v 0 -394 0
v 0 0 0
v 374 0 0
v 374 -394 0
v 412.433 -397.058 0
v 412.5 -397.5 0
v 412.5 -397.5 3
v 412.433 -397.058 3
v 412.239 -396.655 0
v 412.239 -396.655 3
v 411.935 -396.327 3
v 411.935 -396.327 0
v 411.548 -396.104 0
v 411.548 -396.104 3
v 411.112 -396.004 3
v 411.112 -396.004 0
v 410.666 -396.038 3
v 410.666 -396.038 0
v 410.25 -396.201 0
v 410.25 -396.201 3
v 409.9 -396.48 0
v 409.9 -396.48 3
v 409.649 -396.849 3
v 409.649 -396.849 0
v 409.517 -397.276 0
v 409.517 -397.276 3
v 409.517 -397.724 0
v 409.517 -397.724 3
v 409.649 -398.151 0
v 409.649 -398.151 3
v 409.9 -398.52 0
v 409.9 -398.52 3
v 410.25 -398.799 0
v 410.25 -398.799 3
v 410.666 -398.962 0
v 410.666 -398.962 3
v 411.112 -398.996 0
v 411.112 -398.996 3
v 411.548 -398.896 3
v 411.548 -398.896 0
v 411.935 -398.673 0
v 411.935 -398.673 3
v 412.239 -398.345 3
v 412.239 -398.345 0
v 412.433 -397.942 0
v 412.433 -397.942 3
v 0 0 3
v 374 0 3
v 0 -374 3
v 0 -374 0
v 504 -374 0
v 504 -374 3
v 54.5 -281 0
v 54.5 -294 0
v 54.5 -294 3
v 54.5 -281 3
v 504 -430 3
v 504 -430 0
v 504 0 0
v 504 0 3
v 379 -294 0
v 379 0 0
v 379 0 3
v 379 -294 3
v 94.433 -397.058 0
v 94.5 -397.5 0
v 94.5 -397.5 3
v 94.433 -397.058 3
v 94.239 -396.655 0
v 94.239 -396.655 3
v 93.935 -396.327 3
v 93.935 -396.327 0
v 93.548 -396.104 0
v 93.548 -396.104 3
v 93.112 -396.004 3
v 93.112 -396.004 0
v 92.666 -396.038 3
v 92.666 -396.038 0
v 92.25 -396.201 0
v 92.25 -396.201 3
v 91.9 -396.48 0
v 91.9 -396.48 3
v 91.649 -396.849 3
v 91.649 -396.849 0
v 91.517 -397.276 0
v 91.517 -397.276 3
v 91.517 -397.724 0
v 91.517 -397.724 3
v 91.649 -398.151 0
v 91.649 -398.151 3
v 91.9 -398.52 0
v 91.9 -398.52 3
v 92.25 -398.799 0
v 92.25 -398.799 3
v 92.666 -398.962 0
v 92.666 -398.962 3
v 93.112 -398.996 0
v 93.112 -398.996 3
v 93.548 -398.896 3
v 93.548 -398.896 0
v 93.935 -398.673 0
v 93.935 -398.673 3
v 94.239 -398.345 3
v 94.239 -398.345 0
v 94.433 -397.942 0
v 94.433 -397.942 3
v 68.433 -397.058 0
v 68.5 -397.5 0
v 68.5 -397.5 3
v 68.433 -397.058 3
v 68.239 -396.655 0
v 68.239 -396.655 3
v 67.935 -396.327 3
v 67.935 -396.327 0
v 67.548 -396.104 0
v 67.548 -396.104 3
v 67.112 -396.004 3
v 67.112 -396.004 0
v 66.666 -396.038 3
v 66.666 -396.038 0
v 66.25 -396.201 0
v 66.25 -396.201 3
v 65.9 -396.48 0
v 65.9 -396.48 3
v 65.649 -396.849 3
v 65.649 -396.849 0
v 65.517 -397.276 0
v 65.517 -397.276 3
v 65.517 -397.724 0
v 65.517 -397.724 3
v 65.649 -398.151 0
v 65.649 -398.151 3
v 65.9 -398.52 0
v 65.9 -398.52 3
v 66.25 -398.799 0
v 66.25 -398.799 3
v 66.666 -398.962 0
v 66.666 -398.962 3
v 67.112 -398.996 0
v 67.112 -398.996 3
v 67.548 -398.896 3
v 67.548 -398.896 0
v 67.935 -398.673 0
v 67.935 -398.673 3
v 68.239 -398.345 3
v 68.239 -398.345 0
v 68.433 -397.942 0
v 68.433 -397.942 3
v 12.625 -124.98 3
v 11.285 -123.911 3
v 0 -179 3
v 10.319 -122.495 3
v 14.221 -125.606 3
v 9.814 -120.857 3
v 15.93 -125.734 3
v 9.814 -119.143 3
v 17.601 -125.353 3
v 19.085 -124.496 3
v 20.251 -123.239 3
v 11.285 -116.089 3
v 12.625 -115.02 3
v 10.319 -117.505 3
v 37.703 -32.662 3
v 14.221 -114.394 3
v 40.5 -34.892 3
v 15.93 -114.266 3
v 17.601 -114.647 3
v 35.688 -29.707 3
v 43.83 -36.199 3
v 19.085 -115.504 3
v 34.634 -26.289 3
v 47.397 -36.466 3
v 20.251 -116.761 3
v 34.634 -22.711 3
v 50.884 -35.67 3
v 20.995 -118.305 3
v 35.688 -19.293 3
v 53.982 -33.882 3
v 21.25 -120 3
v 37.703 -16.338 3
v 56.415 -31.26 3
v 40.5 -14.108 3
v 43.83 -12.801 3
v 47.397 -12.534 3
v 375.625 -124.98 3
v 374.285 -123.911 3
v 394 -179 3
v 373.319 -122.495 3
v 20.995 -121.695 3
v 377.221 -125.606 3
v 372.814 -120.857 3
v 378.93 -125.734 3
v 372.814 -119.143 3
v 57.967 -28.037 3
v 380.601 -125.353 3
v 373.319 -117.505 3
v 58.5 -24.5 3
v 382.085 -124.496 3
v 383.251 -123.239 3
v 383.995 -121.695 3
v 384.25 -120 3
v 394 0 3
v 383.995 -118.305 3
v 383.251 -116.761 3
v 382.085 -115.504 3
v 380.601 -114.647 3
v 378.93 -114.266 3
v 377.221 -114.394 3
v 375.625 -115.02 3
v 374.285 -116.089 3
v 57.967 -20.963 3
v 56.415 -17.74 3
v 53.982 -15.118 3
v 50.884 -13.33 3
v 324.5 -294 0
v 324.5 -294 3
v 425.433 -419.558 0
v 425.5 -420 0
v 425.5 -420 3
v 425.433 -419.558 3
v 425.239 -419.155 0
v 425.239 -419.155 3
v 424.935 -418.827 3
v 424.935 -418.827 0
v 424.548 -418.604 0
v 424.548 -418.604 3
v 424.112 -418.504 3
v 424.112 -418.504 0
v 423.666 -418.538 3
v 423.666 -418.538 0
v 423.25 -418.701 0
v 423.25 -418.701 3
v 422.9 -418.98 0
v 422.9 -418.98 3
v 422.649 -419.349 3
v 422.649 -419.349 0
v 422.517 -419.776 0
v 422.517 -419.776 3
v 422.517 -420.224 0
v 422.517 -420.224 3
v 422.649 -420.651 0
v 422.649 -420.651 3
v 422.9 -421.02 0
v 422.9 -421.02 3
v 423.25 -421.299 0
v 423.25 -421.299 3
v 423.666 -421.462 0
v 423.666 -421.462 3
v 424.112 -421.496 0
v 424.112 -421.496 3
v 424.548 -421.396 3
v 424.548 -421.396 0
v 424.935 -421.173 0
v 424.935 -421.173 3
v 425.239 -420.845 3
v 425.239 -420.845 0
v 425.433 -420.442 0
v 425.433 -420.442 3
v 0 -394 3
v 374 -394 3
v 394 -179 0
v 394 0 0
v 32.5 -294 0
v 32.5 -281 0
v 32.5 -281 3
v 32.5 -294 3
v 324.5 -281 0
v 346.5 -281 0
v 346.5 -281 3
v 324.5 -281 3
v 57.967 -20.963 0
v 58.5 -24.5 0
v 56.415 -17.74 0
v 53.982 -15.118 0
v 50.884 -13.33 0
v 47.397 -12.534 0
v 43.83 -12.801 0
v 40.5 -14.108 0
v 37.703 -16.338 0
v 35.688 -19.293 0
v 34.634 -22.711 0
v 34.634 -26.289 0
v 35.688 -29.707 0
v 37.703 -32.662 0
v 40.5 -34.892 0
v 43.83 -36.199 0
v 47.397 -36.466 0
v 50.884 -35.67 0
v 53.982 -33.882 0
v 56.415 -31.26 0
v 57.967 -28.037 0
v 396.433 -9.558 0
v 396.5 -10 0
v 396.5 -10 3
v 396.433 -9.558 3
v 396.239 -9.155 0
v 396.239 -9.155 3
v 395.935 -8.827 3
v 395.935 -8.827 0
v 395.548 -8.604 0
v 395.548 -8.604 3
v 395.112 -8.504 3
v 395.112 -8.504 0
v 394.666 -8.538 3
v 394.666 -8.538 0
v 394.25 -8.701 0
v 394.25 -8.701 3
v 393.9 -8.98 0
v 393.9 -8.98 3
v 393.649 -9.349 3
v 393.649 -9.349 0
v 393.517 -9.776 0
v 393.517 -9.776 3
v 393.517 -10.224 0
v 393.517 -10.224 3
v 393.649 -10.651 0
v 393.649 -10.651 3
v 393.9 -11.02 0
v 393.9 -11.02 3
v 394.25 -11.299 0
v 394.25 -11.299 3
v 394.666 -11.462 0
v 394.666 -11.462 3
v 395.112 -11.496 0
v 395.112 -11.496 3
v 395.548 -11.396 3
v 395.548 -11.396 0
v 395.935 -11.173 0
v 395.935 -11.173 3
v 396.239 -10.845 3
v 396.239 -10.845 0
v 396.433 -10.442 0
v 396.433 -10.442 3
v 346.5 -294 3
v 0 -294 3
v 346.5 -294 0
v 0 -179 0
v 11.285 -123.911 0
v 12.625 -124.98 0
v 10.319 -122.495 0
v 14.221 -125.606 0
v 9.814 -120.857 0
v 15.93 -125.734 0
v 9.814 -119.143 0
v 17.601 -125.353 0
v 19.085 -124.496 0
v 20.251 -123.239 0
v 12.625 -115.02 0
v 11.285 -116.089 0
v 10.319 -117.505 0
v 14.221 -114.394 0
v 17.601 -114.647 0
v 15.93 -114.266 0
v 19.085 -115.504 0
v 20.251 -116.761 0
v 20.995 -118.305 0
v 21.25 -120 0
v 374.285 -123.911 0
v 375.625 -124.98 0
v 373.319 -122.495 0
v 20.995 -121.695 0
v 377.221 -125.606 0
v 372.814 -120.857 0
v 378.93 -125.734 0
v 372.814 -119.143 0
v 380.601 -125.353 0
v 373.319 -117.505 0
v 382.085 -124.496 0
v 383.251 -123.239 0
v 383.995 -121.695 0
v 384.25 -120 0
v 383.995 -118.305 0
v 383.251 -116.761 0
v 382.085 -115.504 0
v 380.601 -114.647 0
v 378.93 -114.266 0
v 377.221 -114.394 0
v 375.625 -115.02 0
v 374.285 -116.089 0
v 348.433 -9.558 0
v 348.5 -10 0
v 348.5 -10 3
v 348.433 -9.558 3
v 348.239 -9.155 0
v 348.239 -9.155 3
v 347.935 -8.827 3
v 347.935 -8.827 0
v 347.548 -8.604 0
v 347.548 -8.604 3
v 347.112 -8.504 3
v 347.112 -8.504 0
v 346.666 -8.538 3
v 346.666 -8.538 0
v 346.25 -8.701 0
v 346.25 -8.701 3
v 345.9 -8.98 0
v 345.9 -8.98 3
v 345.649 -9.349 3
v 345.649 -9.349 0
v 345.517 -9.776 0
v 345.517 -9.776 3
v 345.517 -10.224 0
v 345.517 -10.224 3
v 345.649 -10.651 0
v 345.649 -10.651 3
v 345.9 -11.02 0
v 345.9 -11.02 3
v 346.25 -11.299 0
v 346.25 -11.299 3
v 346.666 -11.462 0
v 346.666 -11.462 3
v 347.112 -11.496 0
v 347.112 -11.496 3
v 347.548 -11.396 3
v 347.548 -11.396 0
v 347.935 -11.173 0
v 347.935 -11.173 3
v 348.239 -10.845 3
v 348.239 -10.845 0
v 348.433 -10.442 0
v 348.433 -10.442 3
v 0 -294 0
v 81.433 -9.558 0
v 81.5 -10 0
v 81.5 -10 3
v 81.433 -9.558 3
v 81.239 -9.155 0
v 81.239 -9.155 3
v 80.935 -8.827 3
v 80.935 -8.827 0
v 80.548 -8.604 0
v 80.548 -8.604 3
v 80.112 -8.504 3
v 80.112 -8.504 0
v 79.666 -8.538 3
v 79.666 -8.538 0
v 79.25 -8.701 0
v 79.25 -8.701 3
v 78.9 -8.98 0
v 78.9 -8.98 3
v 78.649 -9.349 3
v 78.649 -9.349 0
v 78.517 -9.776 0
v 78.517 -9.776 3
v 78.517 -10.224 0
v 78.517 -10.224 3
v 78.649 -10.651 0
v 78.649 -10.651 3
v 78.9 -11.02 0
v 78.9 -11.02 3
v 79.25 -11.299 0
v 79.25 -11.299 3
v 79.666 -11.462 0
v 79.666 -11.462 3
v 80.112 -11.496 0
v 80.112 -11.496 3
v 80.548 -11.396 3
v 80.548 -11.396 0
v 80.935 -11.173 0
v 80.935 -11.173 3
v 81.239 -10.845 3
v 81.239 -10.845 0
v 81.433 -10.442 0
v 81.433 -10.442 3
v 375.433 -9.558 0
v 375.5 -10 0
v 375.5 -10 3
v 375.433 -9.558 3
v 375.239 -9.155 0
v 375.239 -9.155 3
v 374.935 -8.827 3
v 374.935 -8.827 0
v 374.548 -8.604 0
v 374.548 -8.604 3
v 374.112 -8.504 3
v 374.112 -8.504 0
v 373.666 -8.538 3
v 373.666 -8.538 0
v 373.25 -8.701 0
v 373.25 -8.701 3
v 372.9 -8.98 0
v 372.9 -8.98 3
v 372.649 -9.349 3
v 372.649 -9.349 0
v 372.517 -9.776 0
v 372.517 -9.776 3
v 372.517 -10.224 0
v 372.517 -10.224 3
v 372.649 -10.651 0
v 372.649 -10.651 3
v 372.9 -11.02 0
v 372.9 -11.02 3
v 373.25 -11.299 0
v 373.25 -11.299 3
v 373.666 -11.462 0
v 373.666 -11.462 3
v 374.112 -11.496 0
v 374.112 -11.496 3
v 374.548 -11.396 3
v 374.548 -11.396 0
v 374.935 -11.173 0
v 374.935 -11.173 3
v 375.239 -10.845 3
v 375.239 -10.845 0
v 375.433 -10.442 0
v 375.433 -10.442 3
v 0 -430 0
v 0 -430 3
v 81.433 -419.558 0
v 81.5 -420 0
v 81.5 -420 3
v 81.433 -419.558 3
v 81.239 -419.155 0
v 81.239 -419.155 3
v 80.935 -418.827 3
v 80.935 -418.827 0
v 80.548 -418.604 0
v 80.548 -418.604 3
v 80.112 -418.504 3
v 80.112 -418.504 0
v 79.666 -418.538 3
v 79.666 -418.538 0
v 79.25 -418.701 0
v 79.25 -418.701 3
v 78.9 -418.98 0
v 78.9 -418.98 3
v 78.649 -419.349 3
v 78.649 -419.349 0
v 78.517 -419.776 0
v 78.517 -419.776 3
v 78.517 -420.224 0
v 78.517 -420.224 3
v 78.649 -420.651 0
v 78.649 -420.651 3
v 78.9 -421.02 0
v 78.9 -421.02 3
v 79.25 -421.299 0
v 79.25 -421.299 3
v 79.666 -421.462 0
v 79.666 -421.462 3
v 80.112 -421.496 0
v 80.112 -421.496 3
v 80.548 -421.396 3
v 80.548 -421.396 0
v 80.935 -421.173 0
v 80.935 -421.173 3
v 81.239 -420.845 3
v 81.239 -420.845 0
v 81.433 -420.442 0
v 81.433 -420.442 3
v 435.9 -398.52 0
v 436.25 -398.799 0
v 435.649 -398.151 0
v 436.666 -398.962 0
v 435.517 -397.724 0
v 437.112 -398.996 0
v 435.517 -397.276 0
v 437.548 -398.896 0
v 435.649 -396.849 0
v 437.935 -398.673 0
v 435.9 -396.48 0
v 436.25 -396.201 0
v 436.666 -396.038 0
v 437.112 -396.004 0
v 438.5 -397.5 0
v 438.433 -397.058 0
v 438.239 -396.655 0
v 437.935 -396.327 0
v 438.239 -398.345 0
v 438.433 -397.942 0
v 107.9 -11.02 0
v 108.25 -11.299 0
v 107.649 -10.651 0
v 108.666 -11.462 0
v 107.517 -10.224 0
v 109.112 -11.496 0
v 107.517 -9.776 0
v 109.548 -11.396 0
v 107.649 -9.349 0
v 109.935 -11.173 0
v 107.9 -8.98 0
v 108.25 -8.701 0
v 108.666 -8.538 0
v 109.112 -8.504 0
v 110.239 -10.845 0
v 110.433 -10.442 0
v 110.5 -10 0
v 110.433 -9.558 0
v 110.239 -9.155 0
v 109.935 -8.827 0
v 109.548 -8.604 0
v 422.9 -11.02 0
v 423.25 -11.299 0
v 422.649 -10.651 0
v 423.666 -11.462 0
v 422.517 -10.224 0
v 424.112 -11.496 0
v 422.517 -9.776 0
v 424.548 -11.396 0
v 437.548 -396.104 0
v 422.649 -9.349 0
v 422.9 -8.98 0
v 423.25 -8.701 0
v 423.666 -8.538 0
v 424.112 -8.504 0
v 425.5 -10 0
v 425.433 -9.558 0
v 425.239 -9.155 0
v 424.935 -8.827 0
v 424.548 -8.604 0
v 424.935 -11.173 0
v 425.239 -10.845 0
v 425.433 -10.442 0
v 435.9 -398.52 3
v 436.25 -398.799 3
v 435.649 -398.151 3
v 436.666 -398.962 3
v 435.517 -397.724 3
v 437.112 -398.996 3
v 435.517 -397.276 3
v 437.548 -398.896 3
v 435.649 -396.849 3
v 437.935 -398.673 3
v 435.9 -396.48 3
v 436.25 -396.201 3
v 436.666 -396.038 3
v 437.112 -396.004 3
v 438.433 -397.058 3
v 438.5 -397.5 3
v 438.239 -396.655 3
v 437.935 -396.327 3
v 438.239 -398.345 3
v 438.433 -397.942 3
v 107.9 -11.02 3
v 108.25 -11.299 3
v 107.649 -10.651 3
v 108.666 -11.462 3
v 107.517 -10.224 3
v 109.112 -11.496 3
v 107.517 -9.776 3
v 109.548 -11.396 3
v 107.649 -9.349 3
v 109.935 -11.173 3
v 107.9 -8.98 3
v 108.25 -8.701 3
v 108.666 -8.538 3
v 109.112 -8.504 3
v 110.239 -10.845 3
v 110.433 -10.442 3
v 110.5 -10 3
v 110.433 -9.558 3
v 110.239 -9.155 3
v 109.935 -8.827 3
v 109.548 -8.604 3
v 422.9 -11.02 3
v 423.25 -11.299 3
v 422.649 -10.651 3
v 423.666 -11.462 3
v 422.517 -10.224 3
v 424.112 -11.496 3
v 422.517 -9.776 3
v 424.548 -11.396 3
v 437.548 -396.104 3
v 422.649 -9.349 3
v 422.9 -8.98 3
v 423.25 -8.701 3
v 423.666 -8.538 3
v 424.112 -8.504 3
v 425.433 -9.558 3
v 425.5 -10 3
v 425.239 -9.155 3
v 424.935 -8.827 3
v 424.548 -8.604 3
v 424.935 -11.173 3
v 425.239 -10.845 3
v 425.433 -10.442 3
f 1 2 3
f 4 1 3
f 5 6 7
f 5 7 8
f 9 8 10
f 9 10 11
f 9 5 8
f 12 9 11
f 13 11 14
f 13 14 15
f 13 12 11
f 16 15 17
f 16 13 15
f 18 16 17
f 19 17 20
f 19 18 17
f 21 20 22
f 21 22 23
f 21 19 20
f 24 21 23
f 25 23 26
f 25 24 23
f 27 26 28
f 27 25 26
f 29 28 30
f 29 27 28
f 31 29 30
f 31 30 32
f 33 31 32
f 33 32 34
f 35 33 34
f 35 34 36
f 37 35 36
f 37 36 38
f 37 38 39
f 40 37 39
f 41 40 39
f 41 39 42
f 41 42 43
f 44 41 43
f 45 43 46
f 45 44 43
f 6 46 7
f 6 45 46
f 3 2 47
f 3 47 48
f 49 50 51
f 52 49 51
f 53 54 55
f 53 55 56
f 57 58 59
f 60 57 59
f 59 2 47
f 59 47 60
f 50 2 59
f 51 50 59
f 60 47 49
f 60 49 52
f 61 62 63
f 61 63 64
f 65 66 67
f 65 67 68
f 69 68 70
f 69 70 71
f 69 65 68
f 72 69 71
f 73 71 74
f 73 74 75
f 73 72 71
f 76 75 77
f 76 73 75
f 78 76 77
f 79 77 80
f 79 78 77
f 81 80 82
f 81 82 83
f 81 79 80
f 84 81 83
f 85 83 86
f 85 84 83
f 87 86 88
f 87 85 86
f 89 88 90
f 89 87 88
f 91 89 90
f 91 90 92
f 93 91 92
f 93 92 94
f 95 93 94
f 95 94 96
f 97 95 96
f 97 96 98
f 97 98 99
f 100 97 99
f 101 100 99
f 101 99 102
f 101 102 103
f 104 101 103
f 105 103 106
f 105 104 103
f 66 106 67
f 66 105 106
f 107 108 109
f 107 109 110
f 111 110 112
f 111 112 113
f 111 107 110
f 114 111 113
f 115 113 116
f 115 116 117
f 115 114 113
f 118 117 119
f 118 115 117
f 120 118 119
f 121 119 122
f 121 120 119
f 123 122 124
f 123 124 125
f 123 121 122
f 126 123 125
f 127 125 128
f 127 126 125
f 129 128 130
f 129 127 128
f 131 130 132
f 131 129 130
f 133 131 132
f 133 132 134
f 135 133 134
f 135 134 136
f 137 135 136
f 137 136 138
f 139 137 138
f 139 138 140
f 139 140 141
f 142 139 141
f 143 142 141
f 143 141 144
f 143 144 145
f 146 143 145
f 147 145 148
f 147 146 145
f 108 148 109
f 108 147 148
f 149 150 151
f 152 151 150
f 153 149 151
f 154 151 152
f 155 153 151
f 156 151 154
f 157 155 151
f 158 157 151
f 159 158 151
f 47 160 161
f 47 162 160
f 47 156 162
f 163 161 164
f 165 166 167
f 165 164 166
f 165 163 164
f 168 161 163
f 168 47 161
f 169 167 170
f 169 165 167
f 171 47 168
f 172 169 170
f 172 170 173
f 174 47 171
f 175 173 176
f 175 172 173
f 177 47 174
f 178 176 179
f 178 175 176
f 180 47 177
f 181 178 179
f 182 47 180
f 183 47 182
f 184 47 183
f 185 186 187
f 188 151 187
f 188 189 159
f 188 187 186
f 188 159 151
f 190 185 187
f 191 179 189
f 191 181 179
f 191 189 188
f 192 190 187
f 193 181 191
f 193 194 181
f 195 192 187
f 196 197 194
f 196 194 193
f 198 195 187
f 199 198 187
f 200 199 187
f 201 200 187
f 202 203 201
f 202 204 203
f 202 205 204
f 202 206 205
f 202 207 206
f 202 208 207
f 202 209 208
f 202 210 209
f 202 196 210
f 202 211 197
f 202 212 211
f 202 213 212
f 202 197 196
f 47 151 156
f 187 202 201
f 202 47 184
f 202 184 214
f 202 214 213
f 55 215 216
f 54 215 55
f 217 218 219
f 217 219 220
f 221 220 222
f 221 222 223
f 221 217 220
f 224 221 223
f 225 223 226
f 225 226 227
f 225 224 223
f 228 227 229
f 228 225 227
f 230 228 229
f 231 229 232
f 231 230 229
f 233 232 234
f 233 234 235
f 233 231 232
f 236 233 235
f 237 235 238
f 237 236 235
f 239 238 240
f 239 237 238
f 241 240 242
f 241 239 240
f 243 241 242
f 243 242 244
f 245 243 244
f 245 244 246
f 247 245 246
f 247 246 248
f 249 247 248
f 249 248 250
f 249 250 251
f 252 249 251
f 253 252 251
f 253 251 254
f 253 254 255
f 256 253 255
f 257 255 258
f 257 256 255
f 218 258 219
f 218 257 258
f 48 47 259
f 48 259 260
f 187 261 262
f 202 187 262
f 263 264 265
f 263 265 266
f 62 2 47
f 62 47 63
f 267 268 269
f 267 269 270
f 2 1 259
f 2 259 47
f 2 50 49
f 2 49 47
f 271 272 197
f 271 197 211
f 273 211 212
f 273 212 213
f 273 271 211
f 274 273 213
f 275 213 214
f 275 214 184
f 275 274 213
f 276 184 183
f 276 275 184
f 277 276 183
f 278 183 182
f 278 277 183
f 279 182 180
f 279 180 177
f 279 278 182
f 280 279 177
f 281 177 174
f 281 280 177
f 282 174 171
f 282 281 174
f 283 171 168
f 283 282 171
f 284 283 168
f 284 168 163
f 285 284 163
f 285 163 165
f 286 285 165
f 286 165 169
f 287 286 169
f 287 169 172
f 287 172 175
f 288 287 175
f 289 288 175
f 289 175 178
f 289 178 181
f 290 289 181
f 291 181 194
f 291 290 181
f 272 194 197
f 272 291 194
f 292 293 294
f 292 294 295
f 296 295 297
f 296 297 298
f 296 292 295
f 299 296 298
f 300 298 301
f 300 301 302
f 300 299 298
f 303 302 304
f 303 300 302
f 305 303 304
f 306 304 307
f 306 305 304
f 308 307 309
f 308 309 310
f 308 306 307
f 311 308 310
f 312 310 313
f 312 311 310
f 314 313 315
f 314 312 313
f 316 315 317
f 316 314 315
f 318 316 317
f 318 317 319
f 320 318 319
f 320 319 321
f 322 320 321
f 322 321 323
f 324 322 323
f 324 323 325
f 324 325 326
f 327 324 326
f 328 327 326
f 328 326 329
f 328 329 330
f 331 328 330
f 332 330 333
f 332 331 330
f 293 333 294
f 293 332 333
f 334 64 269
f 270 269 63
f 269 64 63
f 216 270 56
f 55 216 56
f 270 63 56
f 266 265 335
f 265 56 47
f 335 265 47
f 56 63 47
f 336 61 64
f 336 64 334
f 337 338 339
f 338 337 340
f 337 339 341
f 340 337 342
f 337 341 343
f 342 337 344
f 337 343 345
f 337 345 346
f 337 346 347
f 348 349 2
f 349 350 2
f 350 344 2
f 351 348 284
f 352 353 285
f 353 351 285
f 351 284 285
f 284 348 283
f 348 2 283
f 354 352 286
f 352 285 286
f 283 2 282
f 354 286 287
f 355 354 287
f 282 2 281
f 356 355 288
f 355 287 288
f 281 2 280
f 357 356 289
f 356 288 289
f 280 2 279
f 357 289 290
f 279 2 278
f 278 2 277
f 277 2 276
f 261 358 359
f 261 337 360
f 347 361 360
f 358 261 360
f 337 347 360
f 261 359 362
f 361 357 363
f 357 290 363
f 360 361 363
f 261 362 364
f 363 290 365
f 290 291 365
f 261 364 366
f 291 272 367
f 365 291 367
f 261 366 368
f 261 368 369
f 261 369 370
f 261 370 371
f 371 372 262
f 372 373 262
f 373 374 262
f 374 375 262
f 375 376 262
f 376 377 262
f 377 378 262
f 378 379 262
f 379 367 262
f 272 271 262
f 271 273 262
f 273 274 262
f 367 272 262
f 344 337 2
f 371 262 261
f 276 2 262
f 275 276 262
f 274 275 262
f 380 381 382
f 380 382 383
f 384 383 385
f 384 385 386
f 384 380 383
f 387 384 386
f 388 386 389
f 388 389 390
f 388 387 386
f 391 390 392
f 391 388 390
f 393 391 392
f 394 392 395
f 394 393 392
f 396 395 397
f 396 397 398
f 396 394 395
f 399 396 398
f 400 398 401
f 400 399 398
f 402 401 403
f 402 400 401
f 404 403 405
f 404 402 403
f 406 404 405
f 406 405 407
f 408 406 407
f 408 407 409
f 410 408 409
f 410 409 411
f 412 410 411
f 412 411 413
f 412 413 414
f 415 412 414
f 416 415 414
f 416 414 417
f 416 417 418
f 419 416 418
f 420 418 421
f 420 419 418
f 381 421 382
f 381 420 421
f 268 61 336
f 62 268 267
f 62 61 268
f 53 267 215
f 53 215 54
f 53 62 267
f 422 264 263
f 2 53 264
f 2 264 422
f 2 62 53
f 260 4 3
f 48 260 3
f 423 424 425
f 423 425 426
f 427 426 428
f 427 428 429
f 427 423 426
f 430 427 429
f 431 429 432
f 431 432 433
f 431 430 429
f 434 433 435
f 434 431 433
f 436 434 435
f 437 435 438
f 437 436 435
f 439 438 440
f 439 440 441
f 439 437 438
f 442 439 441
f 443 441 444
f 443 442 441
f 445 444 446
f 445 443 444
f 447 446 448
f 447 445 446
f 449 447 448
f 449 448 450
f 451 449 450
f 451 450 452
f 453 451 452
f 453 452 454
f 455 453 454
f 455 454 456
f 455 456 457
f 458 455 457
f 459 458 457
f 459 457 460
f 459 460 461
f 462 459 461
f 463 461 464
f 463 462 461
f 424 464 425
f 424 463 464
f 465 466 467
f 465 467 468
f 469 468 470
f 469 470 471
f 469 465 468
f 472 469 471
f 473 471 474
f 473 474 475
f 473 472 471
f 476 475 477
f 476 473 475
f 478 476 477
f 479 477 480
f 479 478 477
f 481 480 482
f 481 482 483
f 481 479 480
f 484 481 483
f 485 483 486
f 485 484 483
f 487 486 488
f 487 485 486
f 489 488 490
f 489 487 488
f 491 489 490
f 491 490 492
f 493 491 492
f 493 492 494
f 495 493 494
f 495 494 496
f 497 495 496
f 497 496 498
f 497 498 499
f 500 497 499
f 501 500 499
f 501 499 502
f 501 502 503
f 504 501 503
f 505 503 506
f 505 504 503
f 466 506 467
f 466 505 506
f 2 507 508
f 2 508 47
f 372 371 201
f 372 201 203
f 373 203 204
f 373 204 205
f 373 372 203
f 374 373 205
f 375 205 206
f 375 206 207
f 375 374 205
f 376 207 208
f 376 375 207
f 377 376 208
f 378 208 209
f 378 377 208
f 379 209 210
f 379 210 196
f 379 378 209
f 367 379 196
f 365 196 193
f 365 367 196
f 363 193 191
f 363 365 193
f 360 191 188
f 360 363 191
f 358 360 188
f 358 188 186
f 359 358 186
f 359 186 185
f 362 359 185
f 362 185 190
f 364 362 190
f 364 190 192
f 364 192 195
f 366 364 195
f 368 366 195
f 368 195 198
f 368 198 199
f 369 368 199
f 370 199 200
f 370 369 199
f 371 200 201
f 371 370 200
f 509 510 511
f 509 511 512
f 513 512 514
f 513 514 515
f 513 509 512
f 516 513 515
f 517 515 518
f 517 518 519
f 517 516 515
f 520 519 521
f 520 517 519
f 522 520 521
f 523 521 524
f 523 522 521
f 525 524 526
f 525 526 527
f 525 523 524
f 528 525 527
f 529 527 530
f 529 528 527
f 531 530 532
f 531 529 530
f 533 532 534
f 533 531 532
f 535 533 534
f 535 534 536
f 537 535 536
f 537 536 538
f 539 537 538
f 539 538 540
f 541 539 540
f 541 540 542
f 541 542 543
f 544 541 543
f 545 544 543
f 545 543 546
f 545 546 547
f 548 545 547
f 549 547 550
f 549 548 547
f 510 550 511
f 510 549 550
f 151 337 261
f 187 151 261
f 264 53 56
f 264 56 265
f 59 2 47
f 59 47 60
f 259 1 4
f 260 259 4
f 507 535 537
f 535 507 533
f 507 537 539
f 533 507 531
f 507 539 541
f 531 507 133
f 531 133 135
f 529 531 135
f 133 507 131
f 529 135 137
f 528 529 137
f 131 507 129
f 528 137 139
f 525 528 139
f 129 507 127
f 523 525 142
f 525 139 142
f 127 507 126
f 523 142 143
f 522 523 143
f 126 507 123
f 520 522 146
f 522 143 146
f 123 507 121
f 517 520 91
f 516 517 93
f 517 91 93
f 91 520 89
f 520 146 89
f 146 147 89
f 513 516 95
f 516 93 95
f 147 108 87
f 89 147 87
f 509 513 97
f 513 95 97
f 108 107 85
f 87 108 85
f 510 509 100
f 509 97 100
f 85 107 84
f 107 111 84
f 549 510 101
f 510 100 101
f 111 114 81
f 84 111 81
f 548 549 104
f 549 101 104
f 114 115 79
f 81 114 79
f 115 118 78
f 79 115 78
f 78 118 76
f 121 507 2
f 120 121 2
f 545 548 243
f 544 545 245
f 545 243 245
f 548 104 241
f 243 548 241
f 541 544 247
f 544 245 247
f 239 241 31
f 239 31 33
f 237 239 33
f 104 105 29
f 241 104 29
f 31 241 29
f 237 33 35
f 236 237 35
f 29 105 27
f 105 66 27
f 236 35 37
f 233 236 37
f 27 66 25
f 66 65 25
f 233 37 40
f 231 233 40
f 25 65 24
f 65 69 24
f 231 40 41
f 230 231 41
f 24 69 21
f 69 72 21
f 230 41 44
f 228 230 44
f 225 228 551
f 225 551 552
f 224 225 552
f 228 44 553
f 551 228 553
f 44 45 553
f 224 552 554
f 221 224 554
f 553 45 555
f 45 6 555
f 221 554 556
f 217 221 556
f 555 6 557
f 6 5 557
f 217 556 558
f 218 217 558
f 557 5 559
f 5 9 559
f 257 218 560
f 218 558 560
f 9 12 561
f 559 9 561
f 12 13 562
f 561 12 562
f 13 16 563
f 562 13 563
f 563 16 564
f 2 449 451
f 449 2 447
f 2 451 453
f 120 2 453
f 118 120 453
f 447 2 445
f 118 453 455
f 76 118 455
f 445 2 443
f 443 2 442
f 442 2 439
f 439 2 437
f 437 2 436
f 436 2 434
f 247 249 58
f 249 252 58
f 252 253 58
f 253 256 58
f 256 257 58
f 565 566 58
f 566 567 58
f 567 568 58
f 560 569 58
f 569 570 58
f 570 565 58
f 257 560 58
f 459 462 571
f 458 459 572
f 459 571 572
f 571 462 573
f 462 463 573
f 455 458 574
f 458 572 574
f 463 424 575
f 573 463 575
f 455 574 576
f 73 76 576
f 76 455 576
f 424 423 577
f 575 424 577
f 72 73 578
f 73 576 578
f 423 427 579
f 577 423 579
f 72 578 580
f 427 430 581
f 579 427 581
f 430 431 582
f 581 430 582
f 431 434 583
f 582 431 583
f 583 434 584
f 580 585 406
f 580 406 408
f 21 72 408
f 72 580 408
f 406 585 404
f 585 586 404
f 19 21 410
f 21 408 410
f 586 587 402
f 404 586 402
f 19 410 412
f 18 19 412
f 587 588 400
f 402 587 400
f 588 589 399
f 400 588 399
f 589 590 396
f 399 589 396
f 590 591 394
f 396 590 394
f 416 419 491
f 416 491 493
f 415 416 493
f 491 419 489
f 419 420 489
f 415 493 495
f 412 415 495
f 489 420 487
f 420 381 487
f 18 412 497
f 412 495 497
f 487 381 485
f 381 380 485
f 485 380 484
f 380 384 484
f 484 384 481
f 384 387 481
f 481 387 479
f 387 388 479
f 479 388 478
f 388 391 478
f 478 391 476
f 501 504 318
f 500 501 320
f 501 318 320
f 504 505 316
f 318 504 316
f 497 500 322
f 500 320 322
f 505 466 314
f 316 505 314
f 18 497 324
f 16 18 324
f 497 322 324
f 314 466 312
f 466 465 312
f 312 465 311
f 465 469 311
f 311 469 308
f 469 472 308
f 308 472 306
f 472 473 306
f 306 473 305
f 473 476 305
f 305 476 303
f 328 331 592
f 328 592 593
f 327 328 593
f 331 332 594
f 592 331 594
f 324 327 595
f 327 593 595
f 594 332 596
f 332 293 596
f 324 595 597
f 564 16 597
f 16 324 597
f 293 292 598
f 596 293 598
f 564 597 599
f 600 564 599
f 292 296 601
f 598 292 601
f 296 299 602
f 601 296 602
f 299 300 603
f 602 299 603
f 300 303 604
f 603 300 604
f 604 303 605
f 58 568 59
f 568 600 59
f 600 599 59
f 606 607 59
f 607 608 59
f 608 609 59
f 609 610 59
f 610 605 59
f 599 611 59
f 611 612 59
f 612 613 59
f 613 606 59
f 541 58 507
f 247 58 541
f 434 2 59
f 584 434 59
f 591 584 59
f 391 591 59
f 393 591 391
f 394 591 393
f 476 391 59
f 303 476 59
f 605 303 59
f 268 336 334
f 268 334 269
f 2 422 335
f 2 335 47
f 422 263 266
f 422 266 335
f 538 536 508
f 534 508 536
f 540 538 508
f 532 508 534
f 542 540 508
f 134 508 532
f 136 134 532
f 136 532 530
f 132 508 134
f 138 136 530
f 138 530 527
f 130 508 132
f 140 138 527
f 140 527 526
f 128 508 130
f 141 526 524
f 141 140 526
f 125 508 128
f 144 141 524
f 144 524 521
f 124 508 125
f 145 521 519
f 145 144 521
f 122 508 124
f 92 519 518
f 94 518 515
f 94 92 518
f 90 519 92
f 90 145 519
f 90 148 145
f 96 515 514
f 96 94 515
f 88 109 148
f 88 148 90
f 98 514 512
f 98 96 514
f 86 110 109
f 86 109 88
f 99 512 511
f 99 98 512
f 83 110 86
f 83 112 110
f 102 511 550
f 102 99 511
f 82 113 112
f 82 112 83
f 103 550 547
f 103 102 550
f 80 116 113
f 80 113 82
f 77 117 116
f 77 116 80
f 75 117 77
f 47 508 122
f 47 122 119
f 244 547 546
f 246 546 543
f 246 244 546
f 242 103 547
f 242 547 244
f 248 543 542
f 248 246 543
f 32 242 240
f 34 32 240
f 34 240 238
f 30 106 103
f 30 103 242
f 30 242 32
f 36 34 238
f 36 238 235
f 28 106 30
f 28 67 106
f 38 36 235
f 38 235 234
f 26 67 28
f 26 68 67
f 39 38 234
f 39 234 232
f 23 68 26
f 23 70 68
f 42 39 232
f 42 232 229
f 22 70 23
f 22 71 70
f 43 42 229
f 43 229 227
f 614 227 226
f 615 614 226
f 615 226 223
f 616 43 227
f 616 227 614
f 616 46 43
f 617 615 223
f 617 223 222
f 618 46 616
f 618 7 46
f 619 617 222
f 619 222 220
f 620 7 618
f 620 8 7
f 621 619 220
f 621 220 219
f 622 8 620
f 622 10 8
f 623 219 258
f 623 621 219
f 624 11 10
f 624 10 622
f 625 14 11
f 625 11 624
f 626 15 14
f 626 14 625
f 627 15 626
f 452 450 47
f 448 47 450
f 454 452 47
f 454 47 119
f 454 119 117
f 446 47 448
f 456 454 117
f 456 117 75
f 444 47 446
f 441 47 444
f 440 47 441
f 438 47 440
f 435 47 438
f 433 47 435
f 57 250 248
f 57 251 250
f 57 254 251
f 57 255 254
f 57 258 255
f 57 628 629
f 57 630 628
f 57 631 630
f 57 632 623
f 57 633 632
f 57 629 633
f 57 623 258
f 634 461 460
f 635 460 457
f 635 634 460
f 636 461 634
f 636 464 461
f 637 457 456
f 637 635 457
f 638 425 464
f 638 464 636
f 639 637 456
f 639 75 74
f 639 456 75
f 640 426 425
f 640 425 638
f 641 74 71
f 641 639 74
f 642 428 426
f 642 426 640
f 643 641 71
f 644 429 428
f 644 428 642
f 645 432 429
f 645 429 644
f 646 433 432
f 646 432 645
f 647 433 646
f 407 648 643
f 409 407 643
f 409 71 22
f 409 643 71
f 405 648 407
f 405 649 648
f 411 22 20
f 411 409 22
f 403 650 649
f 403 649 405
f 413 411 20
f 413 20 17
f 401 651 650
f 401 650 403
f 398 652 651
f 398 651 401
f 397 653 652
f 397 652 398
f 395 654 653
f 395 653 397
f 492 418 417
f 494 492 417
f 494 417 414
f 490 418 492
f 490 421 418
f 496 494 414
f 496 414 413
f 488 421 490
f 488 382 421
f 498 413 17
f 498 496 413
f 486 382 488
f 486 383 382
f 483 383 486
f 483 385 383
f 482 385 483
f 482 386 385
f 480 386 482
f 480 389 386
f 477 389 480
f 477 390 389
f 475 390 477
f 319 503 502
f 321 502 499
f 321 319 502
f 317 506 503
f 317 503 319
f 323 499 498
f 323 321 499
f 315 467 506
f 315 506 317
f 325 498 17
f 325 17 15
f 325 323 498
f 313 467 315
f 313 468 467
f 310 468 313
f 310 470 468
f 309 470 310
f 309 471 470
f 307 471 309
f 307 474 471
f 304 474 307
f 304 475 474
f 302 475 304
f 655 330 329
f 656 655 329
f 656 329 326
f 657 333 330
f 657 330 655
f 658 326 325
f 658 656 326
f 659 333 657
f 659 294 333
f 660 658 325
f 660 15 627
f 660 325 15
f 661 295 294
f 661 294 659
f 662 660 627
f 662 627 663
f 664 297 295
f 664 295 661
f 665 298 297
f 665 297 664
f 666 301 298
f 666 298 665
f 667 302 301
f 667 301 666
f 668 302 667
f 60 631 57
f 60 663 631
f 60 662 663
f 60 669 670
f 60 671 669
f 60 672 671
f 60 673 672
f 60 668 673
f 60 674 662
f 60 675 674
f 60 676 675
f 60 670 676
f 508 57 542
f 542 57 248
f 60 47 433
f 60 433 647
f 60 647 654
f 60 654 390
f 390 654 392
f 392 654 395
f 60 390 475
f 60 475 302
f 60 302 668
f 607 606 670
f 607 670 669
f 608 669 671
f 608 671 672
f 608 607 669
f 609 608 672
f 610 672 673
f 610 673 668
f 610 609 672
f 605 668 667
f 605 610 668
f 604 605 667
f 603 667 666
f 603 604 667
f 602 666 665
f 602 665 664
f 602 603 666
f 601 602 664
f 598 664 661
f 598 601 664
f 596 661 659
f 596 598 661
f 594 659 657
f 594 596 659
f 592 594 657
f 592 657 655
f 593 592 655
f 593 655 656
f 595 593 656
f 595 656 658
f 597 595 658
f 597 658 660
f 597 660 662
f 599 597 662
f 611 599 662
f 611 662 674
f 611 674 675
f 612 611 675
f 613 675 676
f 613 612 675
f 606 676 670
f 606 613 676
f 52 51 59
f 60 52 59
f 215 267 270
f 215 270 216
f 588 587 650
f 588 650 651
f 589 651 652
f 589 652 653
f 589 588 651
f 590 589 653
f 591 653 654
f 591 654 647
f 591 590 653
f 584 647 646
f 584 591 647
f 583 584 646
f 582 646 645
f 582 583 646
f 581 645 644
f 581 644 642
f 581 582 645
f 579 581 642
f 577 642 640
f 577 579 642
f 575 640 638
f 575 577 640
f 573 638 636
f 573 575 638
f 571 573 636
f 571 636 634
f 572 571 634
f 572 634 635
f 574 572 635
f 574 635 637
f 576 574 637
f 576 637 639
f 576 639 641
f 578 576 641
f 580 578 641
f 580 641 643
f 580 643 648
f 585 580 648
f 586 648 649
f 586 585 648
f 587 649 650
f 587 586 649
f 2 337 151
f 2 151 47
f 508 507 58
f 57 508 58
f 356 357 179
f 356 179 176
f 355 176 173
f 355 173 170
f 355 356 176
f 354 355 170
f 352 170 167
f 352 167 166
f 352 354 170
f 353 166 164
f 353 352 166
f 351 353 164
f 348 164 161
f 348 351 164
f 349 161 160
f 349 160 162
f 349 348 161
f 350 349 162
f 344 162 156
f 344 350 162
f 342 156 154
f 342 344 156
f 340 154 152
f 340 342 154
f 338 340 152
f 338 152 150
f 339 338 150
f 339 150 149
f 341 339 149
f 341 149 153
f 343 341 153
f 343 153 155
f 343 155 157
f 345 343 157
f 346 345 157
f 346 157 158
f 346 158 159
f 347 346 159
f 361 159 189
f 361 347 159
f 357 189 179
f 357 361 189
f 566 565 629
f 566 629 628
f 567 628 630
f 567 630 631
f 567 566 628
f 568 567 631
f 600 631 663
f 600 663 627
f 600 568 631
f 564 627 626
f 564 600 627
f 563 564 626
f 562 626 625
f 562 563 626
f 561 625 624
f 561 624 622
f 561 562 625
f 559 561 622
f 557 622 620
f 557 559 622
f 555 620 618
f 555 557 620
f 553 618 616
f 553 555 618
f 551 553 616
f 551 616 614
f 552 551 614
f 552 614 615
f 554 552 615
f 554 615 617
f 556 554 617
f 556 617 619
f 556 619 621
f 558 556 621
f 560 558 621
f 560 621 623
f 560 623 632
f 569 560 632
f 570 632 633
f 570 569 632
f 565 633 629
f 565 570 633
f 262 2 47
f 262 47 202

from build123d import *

# Parameters (mm, degrees)
SKETCH_W     = 394
SKETCH_H     = 179
SKETCH_R     = 5.75
SKETCH_R_2   = 12
PAD_DEPTH    = 3
PAD001_DEPTH = 3
SKETCH002_W  = 374
SKETCH002_H  = 394
PAD002_DEPTH = 3
SKETCH003_W  = 504
SKETCH003_H  = 374
PAD004_DEPTH = 3
SKETCH004_W  = 504
SKETCH004_H  = 430
SKETCH004_R  = 1.5
PAD003_DEPTH = 3


with BuildPart() as rear_top:
    # Sketch → Pad (new body)
    with BuildSketch(Plane.XY):
        with Locations((197, -89.5)):
            Rectangle(SKETCH_W, SKETCH_H)
        with Locations((15.5, -120)):
            Circle(SKETCH_R, mode=Mode.SUBTRACT)
        with Locations((378.5, -120)):
            Circle(SKETCH_R, mode=Mode.SUBTRACT)
        with Locations((46.5, -24.5)):
            Circle(SKETCH_R_2, mode=Mode.SUBTRACT)
    extrude(amount=PAD_DEPTH)


with BuildPart() as rear_bottom:
    # Sketch001 → Pad001 (new body)
    with BuildSketch(Plane.XY):
        Polygon((0, 0), (379, 0), (379, -294), (346.5, -294), (346.5, -281), (324.5, -281), (324.5, -294), (54.5, -294), (54.5, -281), (32.5, -281), (32.5, -294), (0, -294), align=None)
    extrude(amount=PAD001_DEPTH)


with BuildPart() as top:
    # Sketch002 → Pad002 (new body)
    with BuildSketch(Plane.XY):
        with Locations((187, -197)):
            Rectangle(SKETCH002_W, SKETCH002_H)
    extrude(amount=PAD002_DEPTH)


with BuildPart() as side:
    # Sketch003 → Pad004 (new body)
    with BuildSketch(Plane.XY):
        with Locations((252, -187)):
            Rectangle(SKETCH003_W, SKETCH003_H)
    extrude(amount=PAD004_DEPTH)


with BuildPart() as front:
    # Sketch004 → Pad003 (new body)
    with BuildSketch(Plane.XY):
        with Locations((252, -215)):
            Rectangle(SKETCH004_W, SKETCH004_H)
        with Locations((80, -10)):
            Circle(SKETCH004_R, mode=Mode.SUBTRACT)
        with Locations((109, -10)):
            Circle(SKETCH004_R, mode=Mode.SUBTRACT)
        with Locations((347, -10)):
            Circle(SKETCH004_R, mode=Mode.SUBTRACT)
        with Locations((374, -10)):
            Circle(SKETCH004_R, mode=Mode.SUBTRACT)
        with Locations((395, -10)):
            Circle(SKETCH004_R, mode=Mode.SUBTRACT)
        with Locations((424, -10)):
            Circle(SKETCH004_R, mode=Mode.SUBTRACT)
        with Locations((67, -397.5)):
            Circle(SKETCH004_R, mode=Mode.SUBTRACT)
        with Locations((80, -420)):
            Circle(SKETCH004_R, mode=Mode.SUBTRACT)
        with Locations((93, -397.5)):
            Circle(SKETCH004_R, mode=Mode.SUBTRACT)
        with Locations((437, -397.5)):
            Circle(SKETCH004_R, mode=Mode.SUBTRACT)
        with Locations((411, -397.5)):
            Circle(SKETCH004_R, mode=Mode.SUBTRACT)
        with Locations((424, -420)):
            Circle(SKETCH004_R, mode=Mode.SUBTRACT)
    extrude(amount=PAD003_DEPTH)


solid = Compound([rear_top.part, rear_bottom.part, top.part, side.part, front.part])
